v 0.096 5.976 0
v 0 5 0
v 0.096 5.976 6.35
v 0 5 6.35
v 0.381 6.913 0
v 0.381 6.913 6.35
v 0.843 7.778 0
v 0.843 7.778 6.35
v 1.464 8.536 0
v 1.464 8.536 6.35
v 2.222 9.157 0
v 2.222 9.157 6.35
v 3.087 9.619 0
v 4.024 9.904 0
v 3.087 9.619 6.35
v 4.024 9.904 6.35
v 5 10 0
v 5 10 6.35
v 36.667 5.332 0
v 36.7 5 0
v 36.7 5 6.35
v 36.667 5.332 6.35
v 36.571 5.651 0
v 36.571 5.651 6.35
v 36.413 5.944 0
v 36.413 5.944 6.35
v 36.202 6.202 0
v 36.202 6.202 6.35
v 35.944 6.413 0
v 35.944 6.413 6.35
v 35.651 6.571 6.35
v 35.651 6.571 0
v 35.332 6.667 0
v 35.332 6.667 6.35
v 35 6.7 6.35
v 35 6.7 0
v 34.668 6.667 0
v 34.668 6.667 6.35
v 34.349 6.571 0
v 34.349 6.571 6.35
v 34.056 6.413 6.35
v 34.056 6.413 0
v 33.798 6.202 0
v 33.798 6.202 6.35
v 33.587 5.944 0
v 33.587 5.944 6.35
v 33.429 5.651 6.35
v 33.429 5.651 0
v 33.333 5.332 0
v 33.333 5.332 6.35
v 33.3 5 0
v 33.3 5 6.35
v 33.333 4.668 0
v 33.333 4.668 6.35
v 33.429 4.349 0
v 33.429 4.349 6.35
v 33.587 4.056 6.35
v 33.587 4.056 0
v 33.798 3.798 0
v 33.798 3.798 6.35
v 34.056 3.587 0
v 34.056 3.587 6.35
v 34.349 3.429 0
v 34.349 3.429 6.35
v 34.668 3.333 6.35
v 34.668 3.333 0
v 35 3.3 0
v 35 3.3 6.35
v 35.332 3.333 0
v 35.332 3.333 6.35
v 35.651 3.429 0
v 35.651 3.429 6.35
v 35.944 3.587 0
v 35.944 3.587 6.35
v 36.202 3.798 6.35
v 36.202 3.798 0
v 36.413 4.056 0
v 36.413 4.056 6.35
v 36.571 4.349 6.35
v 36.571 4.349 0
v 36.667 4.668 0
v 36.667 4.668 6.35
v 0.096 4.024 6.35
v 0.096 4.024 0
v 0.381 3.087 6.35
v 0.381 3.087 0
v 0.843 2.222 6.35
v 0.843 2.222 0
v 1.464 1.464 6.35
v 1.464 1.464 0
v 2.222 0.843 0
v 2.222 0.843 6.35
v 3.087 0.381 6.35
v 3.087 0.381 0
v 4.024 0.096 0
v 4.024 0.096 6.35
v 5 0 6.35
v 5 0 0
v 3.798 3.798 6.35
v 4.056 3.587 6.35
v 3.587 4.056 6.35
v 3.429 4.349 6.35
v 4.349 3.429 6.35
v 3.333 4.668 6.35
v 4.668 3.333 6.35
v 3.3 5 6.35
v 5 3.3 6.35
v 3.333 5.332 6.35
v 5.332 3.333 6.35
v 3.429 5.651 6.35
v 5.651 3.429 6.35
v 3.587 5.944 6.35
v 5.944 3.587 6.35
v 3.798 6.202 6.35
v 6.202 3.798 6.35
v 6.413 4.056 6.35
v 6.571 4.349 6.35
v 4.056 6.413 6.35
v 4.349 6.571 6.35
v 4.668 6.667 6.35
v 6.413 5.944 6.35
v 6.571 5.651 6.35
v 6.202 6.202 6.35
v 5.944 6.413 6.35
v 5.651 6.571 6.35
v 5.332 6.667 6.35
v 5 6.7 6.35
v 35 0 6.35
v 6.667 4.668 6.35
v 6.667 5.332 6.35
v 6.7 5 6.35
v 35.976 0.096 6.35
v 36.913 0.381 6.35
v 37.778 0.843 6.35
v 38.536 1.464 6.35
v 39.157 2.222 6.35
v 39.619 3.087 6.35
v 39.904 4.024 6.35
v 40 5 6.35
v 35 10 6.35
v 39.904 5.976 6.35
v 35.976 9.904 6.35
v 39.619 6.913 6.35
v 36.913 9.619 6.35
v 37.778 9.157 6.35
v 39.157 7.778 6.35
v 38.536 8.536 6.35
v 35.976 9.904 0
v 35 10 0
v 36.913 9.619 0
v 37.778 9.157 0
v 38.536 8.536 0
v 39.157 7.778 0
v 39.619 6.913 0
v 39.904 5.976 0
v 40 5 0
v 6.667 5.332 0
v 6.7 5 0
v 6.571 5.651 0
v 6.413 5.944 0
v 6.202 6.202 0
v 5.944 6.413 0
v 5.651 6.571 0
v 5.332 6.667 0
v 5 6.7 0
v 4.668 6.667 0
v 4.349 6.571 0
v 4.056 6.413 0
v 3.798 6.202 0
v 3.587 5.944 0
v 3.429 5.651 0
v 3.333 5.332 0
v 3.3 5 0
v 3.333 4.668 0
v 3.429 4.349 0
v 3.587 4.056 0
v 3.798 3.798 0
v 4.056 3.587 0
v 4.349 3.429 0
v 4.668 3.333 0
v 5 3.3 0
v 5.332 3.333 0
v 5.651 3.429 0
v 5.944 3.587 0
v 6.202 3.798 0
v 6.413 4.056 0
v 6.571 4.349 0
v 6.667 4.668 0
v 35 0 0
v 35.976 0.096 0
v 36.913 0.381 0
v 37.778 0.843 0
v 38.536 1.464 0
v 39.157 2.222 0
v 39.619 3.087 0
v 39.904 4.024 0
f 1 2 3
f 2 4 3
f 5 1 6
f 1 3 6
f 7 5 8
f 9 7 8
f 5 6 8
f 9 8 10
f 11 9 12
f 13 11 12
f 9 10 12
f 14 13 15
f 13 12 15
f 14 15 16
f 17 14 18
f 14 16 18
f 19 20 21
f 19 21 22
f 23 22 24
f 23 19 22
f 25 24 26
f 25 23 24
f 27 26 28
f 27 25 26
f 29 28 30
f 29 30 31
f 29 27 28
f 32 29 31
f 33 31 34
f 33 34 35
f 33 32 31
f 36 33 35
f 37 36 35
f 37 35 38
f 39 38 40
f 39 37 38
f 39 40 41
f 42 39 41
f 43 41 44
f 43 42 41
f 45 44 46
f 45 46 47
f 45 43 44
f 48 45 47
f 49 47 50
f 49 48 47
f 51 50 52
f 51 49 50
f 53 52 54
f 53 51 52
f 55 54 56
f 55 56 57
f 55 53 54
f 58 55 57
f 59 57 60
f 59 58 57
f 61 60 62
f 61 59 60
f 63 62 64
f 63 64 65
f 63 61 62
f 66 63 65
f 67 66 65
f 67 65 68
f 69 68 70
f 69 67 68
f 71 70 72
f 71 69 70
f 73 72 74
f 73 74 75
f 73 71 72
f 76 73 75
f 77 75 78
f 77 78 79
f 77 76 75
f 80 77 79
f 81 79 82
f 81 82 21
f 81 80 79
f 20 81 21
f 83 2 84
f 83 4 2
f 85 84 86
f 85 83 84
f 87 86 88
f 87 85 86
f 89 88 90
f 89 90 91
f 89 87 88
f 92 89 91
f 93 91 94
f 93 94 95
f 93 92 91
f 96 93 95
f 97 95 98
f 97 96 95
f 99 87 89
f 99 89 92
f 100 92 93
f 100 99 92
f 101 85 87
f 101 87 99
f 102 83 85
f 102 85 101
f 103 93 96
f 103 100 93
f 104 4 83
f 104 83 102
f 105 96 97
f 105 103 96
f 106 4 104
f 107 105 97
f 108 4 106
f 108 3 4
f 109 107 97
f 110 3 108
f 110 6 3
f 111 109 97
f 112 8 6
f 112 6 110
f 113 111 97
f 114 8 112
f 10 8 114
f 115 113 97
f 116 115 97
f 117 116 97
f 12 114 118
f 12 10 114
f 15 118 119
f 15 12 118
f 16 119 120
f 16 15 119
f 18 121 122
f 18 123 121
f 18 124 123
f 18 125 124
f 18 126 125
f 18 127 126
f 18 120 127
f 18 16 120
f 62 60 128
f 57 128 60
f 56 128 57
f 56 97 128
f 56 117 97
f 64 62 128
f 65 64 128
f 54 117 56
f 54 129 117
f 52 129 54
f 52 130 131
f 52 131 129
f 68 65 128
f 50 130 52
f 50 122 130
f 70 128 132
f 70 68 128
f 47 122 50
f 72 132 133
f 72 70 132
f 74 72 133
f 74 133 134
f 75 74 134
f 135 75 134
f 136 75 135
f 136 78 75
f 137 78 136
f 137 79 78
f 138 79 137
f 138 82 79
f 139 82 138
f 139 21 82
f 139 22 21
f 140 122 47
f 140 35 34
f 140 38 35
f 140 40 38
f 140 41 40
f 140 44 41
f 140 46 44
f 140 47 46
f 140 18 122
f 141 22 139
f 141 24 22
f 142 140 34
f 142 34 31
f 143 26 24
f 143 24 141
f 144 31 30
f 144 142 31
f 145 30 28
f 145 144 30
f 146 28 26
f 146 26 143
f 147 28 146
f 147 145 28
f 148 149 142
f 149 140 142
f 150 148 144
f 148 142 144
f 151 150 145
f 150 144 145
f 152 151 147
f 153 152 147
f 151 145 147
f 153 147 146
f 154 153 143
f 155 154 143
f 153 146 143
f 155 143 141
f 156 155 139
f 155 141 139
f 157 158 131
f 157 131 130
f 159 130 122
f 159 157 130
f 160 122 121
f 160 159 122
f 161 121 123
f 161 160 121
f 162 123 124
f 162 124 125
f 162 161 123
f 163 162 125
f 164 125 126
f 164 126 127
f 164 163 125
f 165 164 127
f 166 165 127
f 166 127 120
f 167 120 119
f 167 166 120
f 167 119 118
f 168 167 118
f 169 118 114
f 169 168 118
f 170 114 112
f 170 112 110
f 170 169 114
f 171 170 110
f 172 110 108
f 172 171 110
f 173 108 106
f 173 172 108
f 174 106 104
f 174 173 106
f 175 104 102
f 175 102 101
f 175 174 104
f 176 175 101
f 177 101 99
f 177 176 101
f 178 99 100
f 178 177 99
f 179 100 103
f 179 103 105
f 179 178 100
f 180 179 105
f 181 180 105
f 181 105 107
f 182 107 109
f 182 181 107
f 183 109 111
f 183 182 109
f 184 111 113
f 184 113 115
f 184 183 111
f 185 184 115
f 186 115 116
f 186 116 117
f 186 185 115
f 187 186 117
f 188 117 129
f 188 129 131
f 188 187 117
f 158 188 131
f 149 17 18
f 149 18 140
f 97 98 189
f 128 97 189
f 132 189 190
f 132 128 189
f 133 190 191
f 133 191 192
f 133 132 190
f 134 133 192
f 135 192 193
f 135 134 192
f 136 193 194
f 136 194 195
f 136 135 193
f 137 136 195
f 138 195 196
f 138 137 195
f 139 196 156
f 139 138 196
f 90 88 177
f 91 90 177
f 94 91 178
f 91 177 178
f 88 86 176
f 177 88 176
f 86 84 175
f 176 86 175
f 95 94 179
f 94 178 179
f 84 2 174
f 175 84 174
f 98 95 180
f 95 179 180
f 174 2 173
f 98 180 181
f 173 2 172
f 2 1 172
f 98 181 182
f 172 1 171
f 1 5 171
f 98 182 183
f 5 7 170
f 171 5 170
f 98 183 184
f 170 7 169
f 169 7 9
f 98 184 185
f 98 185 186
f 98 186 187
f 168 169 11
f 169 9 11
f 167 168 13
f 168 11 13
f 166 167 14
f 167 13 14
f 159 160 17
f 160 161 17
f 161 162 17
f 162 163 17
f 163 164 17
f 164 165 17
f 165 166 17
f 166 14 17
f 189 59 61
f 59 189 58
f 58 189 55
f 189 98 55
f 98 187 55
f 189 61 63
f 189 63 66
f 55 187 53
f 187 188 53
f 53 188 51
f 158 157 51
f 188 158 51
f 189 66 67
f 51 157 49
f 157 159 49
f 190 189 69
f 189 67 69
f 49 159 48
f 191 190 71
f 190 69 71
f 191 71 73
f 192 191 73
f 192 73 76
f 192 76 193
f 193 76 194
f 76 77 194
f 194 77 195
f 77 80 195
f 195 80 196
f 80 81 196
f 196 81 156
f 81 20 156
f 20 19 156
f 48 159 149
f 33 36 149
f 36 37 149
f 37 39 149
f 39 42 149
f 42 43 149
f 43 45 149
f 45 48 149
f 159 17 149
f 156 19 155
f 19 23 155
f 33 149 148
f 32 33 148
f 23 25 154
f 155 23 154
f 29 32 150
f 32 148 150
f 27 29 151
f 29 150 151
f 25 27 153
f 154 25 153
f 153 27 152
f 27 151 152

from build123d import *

# Parameters (mm, degrees)
SKETCH1_W           = 40
SKETCH1_H           = 10
SKETCH1_R           = 1.7
BOSS_EXTRUDE1_DEPTH = 6.35
FILLET1_R           = 5


with BuildPart() as part:
    # Sketch1 → Boss-Extrude1 (new body)
    with BuildSketch(Plane.XY):
        with Locations((20, 5)):
            Rectangle(SKETCH1_W, SKETCH1_H)
        with Locations((35, 5)):
            Circle(SKETCH1_R, mode=Mode.SUBTRACT)
        with Locations((5, 5)):
            Circle(SKETCH1_R, mode=Mode.SUBTRACT)
    extrude(amount=BOSS_EXTRUDE1_DEPTH)

    # Fillet1
    fillet1_edges = [part.edges().sort_by_distance(p)[0] for p in [
        (0, 10, 3.175),
        (0, 0, 3.175),
        (40, 10, 3.175),
        (40, 0, 3.175),
    ]]
    fillet(fillet1_edges, radius=FILLET1_R - 0.0001)  # a hair under: the kernel refuses the full size


solid = part.part
